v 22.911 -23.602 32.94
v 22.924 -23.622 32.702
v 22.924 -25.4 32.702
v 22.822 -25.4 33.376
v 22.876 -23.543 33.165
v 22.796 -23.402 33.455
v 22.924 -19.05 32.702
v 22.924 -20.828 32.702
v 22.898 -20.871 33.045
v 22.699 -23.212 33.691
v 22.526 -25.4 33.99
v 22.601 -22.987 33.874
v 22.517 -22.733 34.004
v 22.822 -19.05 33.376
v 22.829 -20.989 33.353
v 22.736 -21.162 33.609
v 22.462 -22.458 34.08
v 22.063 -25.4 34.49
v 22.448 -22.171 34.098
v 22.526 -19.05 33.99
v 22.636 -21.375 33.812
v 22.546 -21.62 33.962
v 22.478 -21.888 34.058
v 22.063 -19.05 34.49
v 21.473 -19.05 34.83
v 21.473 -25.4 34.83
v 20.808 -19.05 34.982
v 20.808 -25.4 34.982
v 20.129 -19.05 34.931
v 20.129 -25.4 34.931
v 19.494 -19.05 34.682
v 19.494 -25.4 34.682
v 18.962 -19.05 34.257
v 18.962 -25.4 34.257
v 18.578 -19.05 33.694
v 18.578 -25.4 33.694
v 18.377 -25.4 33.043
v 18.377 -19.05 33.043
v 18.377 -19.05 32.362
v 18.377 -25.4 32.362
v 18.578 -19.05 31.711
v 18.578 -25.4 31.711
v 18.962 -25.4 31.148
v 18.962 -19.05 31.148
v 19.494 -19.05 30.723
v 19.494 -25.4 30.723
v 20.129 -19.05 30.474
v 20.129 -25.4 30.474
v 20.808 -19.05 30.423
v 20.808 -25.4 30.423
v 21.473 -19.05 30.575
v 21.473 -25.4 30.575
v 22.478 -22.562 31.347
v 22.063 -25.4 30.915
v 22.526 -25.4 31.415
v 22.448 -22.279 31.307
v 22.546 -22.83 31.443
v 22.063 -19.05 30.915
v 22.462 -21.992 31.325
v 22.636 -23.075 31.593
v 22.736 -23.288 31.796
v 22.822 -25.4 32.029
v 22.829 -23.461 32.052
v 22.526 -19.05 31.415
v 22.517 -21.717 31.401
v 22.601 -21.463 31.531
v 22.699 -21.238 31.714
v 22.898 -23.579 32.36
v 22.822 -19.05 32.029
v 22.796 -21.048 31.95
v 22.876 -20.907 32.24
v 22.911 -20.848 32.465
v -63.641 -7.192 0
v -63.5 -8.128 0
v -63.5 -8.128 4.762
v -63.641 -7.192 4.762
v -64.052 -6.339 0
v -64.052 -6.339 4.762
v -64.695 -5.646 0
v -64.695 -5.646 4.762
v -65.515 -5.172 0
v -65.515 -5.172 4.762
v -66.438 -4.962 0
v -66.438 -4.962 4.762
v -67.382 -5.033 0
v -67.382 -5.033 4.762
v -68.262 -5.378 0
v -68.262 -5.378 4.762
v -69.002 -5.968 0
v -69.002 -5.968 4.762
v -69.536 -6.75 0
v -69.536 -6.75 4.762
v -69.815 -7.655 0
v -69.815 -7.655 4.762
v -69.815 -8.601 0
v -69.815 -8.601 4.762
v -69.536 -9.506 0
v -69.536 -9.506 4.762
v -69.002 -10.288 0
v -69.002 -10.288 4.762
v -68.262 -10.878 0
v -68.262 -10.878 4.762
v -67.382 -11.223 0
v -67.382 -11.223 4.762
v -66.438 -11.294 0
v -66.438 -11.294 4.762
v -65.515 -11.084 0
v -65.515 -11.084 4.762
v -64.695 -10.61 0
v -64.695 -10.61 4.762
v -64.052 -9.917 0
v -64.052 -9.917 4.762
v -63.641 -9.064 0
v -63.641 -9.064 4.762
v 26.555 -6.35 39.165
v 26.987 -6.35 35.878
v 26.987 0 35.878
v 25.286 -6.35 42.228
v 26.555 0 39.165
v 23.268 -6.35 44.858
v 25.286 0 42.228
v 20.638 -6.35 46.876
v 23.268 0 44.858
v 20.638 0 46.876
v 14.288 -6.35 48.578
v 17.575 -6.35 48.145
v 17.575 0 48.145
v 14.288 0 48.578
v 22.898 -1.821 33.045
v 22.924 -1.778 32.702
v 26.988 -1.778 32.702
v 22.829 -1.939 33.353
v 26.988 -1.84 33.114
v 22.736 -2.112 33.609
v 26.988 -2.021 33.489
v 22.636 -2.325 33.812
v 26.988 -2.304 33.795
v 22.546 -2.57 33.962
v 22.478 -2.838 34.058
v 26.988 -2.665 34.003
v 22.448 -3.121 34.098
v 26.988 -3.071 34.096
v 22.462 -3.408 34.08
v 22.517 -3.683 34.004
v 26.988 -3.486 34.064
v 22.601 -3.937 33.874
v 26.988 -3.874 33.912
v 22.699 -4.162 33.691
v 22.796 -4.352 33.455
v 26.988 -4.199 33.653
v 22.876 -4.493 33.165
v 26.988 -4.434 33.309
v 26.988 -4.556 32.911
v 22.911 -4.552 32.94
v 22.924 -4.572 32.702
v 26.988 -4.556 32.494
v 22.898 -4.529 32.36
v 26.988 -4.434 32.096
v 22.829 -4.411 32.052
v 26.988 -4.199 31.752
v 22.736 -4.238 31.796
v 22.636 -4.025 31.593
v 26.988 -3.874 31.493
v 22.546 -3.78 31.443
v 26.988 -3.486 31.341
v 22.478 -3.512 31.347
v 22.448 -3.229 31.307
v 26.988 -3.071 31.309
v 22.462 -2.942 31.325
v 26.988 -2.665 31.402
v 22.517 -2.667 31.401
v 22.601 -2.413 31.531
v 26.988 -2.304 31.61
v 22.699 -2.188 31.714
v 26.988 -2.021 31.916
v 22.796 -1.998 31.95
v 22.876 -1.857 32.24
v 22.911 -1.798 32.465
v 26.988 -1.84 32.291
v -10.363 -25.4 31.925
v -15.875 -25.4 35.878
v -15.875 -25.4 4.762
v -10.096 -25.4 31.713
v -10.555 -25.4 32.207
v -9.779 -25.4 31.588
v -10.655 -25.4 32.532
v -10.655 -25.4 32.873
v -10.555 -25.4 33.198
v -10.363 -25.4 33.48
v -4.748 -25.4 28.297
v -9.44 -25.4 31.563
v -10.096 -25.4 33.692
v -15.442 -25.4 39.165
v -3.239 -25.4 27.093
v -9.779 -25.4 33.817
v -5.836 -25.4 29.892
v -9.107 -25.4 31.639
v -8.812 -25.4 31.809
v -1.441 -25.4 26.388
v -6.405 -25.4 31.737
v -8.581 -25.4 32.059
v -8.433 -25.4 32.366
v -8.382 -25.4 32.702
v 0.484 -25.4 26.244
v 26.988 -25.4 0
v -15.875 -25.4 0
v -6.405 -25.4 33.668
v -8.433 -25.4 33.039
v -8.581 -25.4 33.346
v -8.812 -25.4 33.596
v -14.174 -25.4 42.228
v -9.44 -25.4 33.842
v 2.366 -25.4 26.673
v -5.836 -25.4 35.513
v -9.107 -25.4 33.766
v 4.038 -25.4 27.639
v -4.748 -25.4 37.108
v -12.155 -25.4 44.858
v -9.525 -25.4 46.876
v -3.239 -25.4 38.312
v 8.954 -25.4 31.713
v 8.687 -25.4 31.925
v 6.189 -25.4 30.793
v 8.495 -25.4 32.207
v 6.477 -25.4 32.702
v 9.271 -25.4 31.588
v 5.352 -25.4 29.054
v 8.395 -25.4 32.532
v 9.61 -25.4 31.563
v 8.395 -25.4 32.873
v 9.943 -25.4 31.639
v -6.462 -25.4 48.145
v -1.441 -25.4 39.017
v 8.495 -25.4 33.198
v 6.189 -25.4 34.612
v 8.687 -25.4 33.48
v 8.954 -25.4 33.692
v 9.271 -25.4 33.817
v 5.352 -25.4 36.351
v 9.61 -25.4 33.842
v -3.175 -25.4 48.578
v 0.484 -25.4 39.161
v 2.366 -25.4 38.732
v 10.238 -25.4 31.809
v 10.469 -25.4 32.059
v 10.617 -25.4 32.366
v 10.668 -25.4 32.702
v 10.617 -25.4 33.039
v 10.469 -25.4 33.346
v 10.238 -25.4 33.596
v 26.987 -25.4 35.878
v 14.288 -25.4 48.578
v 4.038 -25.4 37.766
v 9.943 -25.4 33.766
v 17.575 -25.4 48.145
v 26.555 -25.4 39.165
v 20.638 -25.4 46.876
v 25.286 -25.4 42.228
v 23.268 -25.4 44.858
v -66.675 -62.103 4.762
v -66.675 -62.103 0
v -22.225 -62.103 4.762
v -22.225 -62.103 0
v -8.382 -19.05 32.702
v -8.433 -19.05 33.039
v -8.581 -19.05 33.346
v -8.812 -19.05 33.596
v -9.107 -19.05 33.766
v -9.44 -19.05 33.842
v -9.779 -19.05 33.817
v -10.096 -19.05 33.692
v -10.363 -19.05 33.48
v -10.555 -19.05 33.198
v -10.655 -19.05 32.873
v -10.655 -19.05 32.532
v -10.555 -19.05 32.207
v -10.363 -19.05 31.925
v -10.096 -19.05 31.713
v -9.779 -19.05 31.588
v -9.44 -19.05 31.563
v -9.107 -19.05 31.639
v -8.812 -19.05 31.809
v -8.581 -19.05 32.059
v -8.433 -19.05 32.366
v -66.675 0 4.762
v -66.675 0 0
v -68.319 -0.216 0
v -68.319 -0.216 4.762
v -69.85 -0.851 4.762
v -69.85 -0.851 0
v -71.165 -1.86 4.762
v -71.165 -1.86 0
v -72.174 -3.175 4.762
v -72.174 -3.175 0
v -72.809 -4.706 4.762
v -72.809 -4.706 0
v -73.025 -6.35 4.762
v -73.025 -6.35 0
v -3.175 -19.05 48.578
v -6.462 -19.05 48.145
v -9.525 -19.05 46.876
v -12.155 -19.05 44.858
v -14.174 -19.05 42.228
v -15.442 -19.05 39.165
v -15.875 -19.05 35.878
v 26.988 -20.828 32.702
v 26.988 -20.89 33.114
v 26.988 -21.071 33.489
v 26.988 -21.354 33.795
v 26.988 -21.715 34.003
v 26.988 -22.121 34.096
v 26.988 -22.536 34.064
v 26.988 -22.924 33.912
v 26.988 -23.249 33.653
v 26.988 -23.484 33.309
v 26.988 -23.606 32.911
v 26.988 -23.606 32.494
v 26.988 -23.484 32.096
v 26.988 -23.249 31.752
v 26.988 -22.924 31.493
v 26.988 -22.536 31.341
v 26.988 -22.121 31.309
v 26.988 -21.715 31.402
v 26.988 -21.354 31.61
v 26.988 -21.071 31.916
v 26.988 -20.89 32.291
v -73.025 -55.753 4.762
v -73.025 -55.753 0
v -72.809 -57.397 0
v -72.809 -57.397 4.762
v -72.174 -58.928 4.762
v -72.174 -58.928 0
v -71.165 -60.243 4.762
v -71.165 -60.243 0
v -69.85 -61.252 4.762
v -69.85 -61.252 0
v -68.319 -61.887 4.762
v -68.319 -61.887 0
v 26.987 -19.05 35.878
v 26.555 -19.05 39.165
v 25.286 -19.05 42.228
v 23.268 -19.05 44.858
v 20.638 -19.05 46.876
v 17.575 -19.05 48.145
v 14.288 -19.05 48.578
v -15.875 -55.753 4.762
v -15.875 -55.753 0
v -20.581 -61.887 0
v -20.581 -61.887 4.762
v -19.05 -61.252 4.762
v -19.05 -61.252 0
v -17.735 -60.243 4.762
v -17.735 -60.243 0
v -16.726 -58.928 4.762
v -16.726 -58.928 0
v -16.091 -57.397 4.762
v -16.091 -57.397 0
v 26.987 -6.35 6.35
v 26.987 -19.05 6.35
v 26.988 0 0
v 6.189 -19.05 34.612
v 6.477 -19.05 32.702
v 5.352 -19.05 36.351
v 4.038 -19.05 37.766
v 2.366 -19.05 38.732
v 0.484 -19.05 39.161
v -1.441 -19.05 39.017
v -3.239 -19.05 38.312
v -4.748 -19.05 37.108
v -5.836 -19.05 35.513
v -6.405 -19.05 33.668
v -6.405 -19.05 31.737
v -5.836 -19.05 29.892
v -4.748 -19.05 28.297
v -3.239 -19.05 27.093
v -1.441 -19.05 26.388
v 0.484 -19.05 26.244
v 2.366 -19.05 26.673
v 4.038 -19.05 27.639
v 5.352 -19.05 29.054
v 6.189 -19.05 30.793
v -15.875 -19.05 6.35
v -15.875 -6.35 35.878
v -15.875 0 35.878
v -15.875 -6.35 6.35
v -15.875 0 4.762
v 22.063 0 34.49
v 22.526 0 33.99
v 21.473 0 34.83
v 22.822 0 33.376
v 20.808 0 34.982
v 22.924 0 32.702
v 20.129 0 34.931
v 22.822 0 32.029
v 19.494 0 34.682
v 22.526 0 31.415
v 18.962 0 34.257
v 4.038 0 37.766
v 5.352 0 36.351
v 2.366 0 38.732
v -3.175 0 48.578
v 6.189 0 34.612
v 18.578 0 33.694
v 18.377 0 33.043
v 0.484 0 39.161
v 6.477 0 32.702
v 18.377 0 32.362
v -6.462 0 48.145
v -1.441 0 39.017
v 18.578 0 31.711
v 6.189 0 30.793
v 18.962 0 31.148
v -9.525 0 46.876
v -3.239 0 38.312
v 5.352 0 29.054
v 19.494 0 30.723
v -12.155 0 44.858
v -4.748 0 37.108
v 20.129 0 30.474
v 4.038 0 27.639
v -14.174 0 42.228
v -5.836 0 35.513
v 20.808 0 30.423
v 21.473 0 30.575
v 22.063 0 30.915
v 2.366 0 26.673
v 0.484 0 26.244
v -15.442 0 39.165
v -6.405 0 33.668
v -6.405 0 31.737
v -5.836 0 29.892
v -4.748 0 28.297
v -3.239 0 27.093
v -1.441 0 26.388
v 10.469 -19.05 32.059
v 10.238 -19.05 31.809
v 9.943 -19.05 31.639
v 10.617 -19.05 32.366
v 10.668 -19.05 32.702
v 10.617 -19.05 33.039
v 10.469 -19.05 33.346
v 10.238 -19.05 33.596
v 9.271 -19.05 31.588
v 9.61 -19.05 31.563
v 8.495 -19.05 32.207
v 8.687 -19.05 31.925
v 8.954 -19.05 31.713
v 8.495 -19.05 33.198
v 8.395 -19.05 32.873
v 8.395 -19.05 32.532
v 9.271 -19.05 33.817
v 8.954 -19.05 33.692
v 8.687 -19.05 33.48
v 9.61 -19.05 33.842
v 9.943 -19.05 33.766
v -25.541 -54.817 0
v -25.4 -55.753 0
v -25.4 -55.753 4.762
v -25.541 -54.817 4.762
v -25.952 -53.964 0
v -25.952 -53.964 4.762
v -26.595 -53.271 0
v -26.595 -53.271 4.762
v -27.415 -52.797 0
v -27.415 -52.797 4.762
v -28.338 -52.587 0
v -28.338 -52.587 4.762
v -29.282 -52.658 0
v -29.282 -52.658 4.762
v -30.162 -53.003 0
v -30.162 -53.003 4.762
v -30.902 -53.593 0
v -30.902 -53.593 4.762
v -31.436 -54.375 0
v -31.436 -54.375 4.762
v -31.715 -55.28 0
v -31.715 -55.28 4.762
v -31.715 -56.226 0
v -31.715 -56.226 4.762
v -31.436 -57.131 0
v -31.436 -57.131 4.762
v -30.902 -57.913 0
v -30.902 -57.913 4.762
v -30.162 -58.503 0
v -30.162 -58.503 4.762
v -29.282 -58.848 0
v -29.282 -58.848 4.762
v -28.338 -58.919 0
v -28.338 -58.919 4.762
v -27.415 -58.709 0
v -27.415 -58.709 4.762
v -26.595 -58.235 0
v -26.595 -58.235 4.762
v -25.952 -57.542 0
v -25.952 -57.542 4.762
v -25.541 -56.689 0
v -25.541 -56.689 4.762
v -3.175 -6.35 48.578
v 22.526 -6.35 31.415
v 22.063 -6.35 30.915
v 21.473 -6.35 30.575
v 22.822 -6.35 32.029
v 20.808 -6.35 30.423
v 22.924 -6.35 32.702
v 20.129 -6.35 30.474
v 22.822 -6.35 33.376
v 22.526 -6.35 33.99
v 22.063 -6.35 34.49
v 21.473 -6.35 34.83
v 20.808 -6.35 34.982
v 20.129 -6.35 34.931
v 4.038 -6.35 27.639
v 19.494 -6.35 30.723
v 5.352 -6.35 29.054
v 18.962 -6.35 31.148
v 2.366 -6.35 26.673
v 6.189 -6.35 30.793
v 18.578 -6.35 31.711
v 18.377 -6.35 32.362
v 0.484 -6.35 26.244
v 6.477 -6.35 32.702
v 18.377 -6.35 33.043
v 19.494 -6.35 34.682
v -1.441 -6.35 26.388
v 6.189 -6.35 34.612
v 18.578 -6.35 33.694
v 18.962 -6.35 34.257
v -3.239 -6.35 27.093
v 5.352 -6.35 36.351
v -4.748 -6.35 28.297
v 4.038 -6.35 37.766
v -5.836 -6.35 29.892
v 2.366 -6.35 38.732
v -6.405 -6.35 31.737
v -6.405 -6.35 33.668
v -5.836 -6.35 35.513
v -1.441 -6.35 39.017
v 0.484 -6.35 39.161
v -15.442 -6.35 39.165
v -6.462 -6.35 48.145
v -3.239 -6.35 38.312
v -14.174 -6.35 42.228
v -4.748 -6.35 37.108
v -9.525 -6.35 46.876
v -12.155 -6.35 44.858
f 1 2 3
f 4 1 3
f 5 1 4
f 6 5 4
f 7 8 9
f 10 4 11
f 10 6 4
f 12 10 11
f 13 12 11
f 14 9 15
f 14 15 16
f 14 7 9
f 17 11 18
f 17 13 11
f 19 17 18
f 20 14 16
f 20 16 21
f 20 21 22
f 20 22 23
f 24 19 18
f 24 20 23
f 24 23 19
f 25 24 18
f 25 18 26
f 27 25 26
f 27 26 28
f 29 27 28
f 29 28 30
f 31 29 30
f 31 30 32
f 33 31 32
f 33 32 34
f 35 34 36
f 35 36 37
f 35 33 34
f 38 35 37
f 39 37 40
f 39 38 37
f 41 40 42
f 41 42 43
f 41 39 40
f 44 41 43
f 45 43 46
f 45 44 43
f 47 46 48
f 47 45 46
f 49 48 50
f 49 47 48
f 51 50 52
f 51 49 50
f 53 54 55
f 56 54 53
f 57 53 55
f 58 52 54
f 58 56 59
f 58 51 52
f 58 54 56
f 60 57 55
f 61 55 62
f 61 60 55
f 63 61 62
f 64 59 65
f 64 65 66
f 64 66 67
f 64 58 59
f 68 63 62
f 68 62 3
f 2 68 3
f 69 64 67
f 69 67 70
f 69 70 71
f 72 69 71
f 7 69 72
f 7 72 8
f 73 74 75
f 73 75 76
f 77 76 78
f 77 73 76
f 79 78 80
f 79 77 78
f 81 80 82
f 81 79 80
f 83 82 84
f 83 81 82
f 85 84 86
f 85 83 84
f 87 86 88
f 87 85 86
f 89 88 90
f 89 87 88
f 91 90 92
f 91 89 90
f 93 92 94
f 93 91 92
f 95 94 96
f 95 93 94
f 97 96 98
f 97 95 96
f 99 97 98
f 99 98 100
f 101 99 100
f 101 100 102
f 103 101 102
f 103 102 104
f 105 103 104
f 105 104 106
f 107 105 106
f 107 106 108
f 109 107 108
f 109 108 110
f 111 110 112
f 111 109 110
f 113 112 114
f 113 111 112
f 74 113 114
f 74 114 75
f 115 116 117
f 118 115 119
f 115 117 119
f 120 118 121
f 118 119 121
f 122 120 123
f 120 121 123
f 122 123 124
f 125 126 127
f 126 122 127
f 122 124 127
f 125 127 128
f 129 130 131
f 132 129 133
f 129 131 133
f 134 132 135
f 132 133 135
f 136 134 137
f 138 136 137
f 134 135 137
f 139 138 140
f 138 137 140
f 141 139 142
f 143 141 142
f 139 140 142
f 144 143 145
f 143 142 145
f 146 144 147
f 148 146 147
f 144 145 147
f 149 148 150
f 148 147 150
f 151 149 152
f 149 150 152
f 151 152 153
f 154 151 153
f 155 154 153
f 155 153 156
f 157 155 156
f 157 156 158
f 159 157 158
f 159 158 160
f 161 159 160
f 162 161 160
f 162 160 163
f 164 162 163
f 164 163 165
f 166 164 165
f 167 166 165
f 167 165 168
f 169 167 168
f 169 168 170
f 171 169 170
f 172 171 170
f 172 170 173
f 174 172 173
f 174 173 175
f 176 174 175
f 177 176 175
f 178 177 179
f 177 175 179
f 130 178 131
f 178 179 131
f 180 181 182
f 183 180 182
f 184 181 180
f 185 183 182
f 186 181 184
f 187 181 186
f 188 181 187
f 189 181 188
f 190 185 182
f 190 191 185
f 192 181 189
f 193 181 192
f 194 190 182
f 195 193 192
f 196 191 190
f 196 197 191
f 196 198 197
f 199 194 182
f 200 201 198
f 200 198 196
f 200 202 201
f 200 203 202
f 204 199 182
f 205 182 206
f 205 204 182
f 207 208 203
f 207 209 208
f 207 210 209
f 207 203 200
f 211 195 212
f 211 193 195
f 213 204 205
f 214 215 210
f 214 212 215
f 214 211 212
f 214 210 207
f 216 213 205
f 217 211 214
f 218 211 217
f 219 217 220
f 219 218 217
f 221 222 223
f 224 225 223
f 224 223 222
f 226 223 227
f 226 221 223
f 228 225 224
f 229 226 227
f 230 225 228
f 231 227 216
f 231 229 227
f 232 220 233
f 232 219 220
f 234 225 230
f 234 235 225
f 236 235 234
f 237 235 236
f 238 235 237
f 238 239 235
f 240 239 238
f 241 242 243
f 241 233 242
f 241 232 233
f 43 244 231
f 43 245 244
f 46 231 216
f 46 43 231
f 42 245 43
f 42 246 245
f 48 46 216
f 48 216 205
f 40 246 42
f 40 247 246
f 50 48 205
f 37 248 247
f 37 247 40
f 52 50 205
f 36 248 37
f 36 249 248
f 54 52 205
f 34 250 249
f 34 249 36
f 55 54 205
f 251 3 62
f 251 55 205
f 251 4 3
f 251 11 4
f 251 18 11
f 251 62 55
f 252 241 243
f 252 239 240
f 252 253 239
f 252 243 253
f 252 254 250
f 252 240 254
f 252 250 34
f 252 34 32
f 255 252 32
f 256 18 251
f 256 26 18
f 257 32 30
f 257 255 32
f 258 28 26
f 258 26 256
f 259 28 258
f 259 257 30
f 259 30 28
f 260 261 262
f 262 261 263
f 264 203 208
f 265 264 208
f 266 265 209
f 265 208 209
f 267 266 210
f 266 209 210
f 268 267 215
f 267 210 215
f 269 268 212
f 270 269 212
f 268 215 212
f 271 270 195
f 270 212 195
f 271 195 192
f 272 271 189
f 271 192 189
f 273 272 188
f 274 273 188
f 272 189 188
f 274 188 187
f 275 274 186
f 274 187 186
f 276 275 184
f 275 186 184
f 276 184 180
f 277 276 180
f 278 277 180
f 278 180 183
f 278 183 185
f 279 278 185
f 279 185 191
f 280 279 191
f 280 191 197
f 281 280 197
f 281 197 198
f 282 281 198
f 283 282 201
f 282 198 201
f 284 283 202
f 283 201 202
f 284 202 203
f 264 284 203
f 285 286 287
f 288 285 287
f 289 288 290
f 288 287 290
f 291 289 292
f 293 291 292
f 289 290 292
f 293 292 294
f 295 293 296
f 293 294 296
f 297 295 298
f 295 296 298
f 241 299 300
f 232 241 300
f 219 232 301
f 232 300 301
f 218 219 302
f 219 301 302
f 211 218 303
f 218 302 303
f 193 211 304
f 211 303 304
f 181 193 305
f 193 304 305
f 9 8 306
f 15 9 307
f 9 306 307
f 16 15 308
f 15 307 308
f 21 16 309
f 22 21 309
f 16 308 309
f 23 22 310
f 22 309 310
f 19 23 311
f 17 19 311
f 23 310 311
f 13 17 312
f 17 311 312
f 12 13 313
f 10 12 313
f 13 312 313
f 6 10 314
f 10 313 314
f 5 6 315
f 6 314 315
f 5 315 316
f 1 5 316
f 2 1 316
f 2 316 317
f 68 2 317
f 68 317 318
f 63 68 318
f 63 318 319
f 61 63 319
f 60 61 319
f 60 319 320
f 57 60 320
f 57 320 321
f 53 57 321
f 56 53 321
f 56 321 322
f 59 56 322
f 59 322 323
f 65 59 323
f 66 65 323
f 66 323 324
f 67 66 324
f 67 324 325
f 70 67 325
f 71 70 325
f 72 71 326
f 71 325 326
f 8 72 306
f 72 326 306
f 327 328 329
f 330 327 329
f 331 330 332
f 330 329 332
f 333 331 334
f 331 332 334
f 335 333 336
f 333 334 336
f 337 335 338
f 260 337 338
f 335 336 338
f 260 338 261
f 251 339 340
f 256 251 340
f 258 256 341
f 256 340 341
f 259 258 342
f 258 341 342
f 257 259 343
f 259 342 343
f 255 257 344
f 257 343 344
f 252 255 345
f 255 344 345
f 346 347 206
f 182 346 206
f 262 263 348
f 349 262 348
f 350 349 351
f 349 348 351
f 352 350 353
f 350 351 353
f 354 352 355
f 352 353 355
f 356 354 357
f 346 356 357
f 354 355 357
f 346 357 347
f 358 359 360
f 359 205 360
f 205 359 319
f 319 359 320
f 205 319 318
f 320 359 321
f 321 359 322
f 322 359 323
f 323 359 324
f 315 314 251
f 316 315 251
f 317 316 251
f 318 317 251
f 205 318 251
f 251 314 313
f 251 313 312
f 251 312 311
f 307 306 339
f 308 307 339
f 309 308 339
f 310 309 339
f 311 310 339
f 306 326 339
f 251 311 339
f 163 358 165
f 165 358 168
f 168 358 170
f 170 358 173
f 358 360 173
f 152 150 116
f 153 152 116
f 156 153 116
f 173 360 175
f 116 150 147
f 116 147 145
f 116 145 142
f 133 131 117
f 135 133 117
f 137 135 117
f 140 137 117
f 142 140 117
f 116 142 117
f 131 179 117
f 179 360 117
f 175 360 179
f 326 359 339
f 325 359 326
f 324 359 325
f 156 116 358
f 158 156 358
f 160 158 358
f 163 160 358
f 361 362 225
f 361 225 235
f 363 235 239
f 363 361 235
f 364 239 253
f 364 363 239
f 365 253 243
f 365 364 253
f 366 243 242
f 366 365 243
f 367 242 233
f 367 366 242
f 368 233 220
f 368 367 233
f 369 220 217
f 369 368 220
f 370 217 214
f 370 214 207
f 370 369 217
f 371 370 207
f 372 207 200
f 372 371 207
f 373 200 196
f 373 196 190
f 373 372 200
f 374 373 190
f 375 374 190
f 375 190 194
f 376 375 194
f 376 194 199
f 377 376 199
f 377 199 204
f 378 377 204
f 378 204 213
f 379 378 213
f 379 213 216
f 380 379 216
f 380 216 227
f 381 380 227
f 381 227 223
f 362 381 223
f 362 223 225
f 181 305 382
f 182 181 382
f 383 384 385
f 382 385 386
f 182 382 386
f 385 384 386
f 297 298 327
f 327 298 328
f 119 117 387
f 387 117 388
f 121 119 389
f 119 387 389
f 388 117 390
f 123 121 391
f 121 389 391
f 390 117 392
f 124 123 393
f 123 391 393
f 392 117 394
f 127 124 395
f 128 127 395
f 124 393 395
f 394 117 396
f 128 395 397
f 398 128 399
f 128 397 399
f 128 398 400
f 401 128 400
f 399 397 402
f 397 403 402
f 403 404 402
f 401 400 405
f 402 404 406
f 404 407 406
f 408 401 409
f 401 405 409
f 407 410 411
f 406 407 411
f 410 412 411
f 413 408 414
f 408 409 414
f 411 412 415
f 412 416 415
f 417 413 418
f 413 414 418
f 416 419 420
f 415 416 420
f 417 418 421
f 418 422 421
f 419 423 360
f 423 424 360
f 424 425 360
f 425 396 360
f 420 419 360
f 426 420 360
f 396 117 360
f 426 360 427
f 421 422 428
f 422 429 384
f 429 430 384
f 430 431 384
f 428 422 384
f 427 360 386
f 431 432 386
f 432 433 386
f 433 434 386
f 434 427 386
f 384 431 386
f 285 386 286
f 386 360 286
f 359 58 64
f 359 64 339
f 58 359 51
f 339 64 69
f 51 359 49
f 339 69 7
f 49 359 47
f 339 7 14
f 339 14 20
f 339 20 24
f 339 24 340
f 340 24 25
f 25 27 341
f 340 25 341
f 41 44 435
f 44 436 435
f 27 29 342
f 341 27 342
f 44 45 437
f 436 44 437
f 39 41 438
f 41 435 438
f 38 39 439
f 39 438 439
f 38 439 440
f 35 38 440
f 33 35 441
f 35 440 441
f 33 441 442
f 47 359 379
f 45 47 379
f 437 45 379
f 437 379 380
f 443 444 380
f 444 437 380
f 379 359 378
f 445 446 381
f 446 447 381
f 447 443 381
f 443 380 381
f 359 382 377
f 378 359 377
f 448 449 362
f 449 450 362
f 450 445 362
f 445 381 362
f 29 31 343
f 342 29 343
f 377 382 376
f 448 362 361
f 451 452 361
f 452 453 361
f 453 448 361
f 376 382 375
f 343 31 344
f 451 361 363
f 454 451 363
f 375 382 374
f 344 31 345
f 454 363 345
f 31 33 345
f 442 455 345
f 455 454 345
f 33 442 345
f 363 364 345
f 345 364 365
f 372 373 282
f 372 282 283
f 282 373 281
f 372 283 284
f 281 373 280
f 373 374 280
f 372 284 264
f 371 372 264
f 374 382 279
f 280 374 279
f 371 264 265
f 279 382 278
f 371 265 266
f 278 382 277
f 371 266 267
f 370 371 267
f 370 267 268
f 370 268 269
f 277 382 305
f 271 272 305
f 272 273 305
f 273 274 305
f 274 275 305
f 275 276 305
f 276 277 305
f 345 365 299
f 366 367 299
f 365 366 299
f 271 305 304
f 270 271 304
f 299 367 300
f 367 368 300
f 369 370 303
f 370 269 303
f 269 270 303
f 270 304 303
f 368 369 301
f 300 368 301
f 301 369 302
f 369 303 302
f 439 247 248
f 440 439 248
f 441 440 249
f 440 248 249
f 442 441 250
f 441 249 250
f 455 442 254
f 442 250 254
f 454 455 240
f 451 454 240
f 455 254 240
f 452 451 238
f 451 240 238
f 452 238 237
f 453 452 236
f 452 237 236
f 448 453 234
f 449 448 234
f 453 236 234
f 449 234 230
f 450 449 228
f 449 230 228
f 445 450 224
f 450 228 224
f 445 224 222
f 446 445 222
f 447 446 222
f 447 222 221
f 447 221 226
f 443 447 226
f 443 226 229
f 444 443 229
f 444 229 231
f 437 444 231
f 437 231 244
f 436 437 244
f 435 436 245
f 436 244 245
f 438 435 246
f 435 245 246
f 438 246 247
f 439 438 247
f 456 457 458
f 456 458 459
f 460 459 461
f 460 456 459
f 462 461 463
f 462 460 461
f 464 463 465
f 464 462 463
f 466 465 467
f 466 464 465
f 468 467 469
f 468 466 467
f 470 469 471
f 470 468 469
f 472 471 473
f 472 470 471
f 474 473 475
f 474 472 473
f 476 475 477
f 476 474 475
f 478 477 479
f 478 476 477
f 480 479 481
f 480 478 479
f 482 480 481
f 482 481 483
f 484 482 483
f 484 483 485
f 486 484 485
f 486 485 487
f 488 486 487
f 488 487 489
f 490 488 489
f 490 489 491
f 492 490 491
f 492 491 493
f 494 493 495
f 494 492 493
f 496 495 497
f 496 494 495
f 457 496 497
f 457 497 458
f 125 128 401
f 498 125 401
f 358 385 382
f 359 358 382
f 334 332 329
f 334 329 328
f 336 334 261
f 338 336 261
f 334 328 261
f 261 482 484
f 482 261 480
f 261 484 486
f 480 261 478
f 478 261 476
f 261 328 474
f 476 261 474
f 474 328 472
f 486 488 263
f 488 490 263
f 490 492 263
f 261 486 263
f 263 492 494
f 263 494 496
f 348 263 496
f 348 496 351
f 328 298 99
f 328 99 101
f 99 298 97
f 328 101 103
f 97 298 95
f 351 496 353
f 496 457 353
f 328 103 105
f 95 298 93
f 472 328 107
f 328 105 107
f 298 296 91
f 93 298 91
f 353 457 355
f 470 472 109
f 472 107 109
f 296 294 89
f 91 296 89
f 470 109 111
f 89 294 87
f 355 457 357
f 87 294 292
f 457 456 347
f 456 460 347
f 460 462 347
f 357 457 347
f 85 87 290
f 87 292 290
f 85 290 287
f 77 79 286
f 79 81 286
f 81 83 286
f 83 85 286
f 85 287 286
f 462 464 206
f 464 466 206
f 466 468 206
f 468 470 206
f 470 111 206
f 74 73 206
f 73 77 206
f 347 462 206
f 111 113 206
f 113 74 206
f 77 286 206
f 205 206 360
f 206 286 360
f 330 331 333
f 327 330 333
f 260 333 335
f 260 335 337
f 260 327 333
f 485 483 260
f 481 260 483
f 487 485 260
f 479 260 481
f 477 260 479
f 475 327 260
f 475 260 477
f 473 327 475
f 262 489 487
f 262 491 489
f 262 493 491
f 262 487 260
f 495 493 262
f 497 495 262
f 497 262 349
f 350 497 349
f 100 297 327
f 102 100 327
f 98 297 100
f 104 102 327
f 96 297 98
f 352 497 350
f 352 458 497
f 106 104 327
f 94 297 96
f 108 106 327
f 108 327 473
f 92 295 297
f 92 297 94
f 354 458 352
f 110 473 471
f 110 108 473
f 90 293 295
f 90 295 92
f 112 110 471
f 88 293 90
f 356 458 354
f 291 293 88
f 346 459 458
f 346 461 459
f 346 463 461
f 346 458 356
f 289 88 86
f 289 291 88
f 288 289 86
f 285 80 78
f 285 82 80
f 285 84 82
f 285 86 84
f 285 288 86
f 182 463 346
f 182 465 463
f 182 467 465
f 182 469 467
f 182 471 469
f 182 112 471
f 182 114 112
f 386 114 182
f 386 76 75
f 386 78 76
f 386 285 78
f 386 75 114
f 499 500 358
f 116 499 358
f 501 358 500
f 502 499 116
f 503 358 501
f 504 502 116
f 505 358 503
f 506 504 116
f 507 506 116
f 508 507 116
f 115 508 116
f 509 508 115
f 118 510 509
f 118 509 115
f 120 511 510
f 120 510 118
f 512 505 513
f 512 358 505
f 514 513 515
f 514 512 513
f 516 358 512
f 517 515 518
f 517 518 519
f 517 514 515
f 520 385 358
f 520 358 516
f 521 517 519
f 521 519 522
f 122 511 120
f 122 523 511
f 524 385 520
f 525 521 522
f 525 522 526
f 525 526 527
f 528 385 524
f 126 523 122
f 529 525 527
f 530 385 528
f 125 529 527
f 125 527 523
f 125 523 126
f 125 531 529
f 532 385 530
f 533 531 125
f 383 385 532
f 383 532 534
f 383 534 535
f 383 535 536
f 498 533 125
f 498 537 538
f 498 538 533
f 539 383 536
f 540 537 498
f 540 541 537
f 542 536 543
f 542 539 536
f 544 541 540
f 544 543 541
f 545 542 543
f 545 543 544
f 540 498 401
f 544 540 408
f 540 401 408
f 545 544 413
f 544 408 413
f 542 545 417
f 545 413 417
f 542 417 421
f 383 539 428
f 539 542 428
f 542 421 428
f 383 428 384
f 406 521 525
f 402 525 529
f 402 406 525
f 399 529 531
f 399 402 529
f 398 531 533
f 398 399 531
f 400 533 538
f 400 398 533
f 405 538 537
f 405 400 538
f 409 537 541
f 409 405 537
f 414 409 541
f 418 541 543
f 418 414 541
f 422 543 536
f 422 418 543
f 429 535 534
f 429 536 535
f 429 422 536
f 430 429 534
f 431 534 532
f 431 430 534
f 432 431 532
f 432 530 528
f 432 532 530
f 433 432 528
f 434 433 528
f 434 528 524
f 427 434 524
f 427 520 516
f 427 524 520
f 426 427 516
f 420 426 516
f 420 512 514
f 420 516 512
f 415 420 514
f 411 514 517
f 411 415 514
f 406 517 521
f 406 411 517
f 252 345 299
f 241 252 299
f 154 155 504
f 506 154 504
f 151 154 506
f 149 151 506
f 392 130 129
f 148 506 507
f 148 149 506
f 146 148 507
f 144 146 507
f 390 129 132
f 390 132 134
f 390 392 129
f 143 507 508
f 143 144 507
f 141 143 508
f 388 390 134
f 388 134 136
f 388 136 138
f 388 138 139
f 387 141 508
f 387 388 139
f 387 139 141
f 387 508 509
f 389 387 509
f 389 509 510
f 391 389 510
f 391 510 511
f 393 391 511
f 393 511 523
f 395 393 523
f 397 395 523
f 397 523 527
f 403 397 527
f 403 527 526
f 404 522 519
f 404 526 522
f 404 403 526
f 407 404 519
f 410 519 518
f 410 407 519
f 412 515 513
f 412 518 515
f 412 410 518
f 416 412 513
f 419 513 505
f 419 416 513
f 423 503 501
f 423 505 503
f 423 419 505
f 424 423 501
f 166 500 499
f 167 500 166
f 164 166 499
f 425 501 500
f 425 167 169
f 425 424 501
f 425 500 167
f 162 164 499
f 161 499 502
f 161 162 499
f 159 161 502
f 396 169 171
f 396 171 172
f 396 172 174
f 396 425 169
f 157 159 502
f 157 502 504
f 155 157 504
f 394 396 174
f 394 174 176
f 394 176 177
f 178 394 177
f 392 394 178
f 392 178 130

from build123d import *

# Parameters (mm, degrees)
F0_R     = 6.477
F0_R_2   = 2.286
F1_DEPTH = 25.4
F2_W     = 12.7
F2_H     = 54.030560414
F3_DEPTH = 42.8635
F4_R     = 3.175
F5_DEPTH = 4.7625
F6_R     = 1.143
F7_DEPTH = 6.35
F8_R     = 1.397
F9_DEPTH = 4.5415286302


with BuildPart() as f1:
    # F0 (on Front) → F1 (new body)
    with BuildSketch(Plane.XZ):
        with BuildLine():
            Line((-15.875, 35.8775), (-15.875, 0))
            Line((-15.875, 0), (26.9875, 0))
            Line((26.9875, 0), (26.9875, 35.8775))
            ThreePointArc((26.9875, 35.8775), (23.2677561211, 44.8577561211), (14.2875, 48.5775))
            Line((14.2875, 48.5775), (-3.175, 48.5775))
            ThreePointArc((-3.175, 48.5775), (-12.1552561211, 44.8577561211), (-15.875, 35.8775))
        make_face()
        with Locations((0, 32.7025)):
            Circle(F0_R, mode=Mode.SUBTRACT)
        with Locations((20.6375, 32.7025)):
            Circle(F0_R_2, mode=Mode.SUBTRACT)
    extrude(amount=F1_DEPTH)

    # F2 (on face) → F3 (cut, through all)
    with BuildSketch(Plane(origin=(-15.875, 0, 0), x_dir=(0, -1, 0), z_dir=(-1, 0, 0))):
        with Locations((12.7, 33.365280207)):
            Rectangle(F2_W, F2_H)
    extrude(amount=-F3_DEPTH, mode=Mode.SUBTRACT)

    # F4 (on Top) → F5 (join)
    with BuildSketch(Plane.XY):
        with BuildLine():
            Line((-15.875, -55.753), (-15.875, 0))
            Line((-15.875, 0), (-66.675, 0))
            ThreePointArc((-66.675, 0), (-71.1651280605, -1.8598719395), (-73.025, -6.35))
            Line((-73.025, -6.35), (-73.025, -55.753))
            ThreePointArc((-73.025, -55.753), (-71.1651280605, -60.2431280605), (-66.675, -62.103))
            Line((-66.675, -62.103), (-22.225, -62.103))
            ThreePointArc((-22.225, -62.103), (-17.7348719395, -60.2431280605), (-15.875, -55.753))
        make_face()
        with Locations((-28.575, -55.753)):
            Circle(F4_R, mode=Mode.SUBTRACT)
        with Locations((-66.675, -8.128)):
            Circle(F4_R, mode=Mode.SUBTRACT)
    extrude(amount=F5_DEPTH)

    # F6 (on face) → F7 (cut, through all)
    with BuildSketch(Plane.XZ.offset(25.4)):
        with Locations((9.525, 32.7025)):
            Circle(F6_R)
        with Locations((-9.525, 32.7025)):
            Circle(F6_R)
    extrude(amount=-F7_DEPTH, mode=Mode.SUBTRACT)

    # F8 (on face) → F9 (cut, through all)
    with BuildSketch(Plane.YZ.offset(26.9875)):
        with Locations((-22.225, 32.7025)):
            Circle(F8_R)
        with Locations((-3.175, 32.7025)):
            Circle(F8_R)
    extrude(amount=-F9_DEPTH, mode=Mode.SUBTRACT)


solid = f1.part
